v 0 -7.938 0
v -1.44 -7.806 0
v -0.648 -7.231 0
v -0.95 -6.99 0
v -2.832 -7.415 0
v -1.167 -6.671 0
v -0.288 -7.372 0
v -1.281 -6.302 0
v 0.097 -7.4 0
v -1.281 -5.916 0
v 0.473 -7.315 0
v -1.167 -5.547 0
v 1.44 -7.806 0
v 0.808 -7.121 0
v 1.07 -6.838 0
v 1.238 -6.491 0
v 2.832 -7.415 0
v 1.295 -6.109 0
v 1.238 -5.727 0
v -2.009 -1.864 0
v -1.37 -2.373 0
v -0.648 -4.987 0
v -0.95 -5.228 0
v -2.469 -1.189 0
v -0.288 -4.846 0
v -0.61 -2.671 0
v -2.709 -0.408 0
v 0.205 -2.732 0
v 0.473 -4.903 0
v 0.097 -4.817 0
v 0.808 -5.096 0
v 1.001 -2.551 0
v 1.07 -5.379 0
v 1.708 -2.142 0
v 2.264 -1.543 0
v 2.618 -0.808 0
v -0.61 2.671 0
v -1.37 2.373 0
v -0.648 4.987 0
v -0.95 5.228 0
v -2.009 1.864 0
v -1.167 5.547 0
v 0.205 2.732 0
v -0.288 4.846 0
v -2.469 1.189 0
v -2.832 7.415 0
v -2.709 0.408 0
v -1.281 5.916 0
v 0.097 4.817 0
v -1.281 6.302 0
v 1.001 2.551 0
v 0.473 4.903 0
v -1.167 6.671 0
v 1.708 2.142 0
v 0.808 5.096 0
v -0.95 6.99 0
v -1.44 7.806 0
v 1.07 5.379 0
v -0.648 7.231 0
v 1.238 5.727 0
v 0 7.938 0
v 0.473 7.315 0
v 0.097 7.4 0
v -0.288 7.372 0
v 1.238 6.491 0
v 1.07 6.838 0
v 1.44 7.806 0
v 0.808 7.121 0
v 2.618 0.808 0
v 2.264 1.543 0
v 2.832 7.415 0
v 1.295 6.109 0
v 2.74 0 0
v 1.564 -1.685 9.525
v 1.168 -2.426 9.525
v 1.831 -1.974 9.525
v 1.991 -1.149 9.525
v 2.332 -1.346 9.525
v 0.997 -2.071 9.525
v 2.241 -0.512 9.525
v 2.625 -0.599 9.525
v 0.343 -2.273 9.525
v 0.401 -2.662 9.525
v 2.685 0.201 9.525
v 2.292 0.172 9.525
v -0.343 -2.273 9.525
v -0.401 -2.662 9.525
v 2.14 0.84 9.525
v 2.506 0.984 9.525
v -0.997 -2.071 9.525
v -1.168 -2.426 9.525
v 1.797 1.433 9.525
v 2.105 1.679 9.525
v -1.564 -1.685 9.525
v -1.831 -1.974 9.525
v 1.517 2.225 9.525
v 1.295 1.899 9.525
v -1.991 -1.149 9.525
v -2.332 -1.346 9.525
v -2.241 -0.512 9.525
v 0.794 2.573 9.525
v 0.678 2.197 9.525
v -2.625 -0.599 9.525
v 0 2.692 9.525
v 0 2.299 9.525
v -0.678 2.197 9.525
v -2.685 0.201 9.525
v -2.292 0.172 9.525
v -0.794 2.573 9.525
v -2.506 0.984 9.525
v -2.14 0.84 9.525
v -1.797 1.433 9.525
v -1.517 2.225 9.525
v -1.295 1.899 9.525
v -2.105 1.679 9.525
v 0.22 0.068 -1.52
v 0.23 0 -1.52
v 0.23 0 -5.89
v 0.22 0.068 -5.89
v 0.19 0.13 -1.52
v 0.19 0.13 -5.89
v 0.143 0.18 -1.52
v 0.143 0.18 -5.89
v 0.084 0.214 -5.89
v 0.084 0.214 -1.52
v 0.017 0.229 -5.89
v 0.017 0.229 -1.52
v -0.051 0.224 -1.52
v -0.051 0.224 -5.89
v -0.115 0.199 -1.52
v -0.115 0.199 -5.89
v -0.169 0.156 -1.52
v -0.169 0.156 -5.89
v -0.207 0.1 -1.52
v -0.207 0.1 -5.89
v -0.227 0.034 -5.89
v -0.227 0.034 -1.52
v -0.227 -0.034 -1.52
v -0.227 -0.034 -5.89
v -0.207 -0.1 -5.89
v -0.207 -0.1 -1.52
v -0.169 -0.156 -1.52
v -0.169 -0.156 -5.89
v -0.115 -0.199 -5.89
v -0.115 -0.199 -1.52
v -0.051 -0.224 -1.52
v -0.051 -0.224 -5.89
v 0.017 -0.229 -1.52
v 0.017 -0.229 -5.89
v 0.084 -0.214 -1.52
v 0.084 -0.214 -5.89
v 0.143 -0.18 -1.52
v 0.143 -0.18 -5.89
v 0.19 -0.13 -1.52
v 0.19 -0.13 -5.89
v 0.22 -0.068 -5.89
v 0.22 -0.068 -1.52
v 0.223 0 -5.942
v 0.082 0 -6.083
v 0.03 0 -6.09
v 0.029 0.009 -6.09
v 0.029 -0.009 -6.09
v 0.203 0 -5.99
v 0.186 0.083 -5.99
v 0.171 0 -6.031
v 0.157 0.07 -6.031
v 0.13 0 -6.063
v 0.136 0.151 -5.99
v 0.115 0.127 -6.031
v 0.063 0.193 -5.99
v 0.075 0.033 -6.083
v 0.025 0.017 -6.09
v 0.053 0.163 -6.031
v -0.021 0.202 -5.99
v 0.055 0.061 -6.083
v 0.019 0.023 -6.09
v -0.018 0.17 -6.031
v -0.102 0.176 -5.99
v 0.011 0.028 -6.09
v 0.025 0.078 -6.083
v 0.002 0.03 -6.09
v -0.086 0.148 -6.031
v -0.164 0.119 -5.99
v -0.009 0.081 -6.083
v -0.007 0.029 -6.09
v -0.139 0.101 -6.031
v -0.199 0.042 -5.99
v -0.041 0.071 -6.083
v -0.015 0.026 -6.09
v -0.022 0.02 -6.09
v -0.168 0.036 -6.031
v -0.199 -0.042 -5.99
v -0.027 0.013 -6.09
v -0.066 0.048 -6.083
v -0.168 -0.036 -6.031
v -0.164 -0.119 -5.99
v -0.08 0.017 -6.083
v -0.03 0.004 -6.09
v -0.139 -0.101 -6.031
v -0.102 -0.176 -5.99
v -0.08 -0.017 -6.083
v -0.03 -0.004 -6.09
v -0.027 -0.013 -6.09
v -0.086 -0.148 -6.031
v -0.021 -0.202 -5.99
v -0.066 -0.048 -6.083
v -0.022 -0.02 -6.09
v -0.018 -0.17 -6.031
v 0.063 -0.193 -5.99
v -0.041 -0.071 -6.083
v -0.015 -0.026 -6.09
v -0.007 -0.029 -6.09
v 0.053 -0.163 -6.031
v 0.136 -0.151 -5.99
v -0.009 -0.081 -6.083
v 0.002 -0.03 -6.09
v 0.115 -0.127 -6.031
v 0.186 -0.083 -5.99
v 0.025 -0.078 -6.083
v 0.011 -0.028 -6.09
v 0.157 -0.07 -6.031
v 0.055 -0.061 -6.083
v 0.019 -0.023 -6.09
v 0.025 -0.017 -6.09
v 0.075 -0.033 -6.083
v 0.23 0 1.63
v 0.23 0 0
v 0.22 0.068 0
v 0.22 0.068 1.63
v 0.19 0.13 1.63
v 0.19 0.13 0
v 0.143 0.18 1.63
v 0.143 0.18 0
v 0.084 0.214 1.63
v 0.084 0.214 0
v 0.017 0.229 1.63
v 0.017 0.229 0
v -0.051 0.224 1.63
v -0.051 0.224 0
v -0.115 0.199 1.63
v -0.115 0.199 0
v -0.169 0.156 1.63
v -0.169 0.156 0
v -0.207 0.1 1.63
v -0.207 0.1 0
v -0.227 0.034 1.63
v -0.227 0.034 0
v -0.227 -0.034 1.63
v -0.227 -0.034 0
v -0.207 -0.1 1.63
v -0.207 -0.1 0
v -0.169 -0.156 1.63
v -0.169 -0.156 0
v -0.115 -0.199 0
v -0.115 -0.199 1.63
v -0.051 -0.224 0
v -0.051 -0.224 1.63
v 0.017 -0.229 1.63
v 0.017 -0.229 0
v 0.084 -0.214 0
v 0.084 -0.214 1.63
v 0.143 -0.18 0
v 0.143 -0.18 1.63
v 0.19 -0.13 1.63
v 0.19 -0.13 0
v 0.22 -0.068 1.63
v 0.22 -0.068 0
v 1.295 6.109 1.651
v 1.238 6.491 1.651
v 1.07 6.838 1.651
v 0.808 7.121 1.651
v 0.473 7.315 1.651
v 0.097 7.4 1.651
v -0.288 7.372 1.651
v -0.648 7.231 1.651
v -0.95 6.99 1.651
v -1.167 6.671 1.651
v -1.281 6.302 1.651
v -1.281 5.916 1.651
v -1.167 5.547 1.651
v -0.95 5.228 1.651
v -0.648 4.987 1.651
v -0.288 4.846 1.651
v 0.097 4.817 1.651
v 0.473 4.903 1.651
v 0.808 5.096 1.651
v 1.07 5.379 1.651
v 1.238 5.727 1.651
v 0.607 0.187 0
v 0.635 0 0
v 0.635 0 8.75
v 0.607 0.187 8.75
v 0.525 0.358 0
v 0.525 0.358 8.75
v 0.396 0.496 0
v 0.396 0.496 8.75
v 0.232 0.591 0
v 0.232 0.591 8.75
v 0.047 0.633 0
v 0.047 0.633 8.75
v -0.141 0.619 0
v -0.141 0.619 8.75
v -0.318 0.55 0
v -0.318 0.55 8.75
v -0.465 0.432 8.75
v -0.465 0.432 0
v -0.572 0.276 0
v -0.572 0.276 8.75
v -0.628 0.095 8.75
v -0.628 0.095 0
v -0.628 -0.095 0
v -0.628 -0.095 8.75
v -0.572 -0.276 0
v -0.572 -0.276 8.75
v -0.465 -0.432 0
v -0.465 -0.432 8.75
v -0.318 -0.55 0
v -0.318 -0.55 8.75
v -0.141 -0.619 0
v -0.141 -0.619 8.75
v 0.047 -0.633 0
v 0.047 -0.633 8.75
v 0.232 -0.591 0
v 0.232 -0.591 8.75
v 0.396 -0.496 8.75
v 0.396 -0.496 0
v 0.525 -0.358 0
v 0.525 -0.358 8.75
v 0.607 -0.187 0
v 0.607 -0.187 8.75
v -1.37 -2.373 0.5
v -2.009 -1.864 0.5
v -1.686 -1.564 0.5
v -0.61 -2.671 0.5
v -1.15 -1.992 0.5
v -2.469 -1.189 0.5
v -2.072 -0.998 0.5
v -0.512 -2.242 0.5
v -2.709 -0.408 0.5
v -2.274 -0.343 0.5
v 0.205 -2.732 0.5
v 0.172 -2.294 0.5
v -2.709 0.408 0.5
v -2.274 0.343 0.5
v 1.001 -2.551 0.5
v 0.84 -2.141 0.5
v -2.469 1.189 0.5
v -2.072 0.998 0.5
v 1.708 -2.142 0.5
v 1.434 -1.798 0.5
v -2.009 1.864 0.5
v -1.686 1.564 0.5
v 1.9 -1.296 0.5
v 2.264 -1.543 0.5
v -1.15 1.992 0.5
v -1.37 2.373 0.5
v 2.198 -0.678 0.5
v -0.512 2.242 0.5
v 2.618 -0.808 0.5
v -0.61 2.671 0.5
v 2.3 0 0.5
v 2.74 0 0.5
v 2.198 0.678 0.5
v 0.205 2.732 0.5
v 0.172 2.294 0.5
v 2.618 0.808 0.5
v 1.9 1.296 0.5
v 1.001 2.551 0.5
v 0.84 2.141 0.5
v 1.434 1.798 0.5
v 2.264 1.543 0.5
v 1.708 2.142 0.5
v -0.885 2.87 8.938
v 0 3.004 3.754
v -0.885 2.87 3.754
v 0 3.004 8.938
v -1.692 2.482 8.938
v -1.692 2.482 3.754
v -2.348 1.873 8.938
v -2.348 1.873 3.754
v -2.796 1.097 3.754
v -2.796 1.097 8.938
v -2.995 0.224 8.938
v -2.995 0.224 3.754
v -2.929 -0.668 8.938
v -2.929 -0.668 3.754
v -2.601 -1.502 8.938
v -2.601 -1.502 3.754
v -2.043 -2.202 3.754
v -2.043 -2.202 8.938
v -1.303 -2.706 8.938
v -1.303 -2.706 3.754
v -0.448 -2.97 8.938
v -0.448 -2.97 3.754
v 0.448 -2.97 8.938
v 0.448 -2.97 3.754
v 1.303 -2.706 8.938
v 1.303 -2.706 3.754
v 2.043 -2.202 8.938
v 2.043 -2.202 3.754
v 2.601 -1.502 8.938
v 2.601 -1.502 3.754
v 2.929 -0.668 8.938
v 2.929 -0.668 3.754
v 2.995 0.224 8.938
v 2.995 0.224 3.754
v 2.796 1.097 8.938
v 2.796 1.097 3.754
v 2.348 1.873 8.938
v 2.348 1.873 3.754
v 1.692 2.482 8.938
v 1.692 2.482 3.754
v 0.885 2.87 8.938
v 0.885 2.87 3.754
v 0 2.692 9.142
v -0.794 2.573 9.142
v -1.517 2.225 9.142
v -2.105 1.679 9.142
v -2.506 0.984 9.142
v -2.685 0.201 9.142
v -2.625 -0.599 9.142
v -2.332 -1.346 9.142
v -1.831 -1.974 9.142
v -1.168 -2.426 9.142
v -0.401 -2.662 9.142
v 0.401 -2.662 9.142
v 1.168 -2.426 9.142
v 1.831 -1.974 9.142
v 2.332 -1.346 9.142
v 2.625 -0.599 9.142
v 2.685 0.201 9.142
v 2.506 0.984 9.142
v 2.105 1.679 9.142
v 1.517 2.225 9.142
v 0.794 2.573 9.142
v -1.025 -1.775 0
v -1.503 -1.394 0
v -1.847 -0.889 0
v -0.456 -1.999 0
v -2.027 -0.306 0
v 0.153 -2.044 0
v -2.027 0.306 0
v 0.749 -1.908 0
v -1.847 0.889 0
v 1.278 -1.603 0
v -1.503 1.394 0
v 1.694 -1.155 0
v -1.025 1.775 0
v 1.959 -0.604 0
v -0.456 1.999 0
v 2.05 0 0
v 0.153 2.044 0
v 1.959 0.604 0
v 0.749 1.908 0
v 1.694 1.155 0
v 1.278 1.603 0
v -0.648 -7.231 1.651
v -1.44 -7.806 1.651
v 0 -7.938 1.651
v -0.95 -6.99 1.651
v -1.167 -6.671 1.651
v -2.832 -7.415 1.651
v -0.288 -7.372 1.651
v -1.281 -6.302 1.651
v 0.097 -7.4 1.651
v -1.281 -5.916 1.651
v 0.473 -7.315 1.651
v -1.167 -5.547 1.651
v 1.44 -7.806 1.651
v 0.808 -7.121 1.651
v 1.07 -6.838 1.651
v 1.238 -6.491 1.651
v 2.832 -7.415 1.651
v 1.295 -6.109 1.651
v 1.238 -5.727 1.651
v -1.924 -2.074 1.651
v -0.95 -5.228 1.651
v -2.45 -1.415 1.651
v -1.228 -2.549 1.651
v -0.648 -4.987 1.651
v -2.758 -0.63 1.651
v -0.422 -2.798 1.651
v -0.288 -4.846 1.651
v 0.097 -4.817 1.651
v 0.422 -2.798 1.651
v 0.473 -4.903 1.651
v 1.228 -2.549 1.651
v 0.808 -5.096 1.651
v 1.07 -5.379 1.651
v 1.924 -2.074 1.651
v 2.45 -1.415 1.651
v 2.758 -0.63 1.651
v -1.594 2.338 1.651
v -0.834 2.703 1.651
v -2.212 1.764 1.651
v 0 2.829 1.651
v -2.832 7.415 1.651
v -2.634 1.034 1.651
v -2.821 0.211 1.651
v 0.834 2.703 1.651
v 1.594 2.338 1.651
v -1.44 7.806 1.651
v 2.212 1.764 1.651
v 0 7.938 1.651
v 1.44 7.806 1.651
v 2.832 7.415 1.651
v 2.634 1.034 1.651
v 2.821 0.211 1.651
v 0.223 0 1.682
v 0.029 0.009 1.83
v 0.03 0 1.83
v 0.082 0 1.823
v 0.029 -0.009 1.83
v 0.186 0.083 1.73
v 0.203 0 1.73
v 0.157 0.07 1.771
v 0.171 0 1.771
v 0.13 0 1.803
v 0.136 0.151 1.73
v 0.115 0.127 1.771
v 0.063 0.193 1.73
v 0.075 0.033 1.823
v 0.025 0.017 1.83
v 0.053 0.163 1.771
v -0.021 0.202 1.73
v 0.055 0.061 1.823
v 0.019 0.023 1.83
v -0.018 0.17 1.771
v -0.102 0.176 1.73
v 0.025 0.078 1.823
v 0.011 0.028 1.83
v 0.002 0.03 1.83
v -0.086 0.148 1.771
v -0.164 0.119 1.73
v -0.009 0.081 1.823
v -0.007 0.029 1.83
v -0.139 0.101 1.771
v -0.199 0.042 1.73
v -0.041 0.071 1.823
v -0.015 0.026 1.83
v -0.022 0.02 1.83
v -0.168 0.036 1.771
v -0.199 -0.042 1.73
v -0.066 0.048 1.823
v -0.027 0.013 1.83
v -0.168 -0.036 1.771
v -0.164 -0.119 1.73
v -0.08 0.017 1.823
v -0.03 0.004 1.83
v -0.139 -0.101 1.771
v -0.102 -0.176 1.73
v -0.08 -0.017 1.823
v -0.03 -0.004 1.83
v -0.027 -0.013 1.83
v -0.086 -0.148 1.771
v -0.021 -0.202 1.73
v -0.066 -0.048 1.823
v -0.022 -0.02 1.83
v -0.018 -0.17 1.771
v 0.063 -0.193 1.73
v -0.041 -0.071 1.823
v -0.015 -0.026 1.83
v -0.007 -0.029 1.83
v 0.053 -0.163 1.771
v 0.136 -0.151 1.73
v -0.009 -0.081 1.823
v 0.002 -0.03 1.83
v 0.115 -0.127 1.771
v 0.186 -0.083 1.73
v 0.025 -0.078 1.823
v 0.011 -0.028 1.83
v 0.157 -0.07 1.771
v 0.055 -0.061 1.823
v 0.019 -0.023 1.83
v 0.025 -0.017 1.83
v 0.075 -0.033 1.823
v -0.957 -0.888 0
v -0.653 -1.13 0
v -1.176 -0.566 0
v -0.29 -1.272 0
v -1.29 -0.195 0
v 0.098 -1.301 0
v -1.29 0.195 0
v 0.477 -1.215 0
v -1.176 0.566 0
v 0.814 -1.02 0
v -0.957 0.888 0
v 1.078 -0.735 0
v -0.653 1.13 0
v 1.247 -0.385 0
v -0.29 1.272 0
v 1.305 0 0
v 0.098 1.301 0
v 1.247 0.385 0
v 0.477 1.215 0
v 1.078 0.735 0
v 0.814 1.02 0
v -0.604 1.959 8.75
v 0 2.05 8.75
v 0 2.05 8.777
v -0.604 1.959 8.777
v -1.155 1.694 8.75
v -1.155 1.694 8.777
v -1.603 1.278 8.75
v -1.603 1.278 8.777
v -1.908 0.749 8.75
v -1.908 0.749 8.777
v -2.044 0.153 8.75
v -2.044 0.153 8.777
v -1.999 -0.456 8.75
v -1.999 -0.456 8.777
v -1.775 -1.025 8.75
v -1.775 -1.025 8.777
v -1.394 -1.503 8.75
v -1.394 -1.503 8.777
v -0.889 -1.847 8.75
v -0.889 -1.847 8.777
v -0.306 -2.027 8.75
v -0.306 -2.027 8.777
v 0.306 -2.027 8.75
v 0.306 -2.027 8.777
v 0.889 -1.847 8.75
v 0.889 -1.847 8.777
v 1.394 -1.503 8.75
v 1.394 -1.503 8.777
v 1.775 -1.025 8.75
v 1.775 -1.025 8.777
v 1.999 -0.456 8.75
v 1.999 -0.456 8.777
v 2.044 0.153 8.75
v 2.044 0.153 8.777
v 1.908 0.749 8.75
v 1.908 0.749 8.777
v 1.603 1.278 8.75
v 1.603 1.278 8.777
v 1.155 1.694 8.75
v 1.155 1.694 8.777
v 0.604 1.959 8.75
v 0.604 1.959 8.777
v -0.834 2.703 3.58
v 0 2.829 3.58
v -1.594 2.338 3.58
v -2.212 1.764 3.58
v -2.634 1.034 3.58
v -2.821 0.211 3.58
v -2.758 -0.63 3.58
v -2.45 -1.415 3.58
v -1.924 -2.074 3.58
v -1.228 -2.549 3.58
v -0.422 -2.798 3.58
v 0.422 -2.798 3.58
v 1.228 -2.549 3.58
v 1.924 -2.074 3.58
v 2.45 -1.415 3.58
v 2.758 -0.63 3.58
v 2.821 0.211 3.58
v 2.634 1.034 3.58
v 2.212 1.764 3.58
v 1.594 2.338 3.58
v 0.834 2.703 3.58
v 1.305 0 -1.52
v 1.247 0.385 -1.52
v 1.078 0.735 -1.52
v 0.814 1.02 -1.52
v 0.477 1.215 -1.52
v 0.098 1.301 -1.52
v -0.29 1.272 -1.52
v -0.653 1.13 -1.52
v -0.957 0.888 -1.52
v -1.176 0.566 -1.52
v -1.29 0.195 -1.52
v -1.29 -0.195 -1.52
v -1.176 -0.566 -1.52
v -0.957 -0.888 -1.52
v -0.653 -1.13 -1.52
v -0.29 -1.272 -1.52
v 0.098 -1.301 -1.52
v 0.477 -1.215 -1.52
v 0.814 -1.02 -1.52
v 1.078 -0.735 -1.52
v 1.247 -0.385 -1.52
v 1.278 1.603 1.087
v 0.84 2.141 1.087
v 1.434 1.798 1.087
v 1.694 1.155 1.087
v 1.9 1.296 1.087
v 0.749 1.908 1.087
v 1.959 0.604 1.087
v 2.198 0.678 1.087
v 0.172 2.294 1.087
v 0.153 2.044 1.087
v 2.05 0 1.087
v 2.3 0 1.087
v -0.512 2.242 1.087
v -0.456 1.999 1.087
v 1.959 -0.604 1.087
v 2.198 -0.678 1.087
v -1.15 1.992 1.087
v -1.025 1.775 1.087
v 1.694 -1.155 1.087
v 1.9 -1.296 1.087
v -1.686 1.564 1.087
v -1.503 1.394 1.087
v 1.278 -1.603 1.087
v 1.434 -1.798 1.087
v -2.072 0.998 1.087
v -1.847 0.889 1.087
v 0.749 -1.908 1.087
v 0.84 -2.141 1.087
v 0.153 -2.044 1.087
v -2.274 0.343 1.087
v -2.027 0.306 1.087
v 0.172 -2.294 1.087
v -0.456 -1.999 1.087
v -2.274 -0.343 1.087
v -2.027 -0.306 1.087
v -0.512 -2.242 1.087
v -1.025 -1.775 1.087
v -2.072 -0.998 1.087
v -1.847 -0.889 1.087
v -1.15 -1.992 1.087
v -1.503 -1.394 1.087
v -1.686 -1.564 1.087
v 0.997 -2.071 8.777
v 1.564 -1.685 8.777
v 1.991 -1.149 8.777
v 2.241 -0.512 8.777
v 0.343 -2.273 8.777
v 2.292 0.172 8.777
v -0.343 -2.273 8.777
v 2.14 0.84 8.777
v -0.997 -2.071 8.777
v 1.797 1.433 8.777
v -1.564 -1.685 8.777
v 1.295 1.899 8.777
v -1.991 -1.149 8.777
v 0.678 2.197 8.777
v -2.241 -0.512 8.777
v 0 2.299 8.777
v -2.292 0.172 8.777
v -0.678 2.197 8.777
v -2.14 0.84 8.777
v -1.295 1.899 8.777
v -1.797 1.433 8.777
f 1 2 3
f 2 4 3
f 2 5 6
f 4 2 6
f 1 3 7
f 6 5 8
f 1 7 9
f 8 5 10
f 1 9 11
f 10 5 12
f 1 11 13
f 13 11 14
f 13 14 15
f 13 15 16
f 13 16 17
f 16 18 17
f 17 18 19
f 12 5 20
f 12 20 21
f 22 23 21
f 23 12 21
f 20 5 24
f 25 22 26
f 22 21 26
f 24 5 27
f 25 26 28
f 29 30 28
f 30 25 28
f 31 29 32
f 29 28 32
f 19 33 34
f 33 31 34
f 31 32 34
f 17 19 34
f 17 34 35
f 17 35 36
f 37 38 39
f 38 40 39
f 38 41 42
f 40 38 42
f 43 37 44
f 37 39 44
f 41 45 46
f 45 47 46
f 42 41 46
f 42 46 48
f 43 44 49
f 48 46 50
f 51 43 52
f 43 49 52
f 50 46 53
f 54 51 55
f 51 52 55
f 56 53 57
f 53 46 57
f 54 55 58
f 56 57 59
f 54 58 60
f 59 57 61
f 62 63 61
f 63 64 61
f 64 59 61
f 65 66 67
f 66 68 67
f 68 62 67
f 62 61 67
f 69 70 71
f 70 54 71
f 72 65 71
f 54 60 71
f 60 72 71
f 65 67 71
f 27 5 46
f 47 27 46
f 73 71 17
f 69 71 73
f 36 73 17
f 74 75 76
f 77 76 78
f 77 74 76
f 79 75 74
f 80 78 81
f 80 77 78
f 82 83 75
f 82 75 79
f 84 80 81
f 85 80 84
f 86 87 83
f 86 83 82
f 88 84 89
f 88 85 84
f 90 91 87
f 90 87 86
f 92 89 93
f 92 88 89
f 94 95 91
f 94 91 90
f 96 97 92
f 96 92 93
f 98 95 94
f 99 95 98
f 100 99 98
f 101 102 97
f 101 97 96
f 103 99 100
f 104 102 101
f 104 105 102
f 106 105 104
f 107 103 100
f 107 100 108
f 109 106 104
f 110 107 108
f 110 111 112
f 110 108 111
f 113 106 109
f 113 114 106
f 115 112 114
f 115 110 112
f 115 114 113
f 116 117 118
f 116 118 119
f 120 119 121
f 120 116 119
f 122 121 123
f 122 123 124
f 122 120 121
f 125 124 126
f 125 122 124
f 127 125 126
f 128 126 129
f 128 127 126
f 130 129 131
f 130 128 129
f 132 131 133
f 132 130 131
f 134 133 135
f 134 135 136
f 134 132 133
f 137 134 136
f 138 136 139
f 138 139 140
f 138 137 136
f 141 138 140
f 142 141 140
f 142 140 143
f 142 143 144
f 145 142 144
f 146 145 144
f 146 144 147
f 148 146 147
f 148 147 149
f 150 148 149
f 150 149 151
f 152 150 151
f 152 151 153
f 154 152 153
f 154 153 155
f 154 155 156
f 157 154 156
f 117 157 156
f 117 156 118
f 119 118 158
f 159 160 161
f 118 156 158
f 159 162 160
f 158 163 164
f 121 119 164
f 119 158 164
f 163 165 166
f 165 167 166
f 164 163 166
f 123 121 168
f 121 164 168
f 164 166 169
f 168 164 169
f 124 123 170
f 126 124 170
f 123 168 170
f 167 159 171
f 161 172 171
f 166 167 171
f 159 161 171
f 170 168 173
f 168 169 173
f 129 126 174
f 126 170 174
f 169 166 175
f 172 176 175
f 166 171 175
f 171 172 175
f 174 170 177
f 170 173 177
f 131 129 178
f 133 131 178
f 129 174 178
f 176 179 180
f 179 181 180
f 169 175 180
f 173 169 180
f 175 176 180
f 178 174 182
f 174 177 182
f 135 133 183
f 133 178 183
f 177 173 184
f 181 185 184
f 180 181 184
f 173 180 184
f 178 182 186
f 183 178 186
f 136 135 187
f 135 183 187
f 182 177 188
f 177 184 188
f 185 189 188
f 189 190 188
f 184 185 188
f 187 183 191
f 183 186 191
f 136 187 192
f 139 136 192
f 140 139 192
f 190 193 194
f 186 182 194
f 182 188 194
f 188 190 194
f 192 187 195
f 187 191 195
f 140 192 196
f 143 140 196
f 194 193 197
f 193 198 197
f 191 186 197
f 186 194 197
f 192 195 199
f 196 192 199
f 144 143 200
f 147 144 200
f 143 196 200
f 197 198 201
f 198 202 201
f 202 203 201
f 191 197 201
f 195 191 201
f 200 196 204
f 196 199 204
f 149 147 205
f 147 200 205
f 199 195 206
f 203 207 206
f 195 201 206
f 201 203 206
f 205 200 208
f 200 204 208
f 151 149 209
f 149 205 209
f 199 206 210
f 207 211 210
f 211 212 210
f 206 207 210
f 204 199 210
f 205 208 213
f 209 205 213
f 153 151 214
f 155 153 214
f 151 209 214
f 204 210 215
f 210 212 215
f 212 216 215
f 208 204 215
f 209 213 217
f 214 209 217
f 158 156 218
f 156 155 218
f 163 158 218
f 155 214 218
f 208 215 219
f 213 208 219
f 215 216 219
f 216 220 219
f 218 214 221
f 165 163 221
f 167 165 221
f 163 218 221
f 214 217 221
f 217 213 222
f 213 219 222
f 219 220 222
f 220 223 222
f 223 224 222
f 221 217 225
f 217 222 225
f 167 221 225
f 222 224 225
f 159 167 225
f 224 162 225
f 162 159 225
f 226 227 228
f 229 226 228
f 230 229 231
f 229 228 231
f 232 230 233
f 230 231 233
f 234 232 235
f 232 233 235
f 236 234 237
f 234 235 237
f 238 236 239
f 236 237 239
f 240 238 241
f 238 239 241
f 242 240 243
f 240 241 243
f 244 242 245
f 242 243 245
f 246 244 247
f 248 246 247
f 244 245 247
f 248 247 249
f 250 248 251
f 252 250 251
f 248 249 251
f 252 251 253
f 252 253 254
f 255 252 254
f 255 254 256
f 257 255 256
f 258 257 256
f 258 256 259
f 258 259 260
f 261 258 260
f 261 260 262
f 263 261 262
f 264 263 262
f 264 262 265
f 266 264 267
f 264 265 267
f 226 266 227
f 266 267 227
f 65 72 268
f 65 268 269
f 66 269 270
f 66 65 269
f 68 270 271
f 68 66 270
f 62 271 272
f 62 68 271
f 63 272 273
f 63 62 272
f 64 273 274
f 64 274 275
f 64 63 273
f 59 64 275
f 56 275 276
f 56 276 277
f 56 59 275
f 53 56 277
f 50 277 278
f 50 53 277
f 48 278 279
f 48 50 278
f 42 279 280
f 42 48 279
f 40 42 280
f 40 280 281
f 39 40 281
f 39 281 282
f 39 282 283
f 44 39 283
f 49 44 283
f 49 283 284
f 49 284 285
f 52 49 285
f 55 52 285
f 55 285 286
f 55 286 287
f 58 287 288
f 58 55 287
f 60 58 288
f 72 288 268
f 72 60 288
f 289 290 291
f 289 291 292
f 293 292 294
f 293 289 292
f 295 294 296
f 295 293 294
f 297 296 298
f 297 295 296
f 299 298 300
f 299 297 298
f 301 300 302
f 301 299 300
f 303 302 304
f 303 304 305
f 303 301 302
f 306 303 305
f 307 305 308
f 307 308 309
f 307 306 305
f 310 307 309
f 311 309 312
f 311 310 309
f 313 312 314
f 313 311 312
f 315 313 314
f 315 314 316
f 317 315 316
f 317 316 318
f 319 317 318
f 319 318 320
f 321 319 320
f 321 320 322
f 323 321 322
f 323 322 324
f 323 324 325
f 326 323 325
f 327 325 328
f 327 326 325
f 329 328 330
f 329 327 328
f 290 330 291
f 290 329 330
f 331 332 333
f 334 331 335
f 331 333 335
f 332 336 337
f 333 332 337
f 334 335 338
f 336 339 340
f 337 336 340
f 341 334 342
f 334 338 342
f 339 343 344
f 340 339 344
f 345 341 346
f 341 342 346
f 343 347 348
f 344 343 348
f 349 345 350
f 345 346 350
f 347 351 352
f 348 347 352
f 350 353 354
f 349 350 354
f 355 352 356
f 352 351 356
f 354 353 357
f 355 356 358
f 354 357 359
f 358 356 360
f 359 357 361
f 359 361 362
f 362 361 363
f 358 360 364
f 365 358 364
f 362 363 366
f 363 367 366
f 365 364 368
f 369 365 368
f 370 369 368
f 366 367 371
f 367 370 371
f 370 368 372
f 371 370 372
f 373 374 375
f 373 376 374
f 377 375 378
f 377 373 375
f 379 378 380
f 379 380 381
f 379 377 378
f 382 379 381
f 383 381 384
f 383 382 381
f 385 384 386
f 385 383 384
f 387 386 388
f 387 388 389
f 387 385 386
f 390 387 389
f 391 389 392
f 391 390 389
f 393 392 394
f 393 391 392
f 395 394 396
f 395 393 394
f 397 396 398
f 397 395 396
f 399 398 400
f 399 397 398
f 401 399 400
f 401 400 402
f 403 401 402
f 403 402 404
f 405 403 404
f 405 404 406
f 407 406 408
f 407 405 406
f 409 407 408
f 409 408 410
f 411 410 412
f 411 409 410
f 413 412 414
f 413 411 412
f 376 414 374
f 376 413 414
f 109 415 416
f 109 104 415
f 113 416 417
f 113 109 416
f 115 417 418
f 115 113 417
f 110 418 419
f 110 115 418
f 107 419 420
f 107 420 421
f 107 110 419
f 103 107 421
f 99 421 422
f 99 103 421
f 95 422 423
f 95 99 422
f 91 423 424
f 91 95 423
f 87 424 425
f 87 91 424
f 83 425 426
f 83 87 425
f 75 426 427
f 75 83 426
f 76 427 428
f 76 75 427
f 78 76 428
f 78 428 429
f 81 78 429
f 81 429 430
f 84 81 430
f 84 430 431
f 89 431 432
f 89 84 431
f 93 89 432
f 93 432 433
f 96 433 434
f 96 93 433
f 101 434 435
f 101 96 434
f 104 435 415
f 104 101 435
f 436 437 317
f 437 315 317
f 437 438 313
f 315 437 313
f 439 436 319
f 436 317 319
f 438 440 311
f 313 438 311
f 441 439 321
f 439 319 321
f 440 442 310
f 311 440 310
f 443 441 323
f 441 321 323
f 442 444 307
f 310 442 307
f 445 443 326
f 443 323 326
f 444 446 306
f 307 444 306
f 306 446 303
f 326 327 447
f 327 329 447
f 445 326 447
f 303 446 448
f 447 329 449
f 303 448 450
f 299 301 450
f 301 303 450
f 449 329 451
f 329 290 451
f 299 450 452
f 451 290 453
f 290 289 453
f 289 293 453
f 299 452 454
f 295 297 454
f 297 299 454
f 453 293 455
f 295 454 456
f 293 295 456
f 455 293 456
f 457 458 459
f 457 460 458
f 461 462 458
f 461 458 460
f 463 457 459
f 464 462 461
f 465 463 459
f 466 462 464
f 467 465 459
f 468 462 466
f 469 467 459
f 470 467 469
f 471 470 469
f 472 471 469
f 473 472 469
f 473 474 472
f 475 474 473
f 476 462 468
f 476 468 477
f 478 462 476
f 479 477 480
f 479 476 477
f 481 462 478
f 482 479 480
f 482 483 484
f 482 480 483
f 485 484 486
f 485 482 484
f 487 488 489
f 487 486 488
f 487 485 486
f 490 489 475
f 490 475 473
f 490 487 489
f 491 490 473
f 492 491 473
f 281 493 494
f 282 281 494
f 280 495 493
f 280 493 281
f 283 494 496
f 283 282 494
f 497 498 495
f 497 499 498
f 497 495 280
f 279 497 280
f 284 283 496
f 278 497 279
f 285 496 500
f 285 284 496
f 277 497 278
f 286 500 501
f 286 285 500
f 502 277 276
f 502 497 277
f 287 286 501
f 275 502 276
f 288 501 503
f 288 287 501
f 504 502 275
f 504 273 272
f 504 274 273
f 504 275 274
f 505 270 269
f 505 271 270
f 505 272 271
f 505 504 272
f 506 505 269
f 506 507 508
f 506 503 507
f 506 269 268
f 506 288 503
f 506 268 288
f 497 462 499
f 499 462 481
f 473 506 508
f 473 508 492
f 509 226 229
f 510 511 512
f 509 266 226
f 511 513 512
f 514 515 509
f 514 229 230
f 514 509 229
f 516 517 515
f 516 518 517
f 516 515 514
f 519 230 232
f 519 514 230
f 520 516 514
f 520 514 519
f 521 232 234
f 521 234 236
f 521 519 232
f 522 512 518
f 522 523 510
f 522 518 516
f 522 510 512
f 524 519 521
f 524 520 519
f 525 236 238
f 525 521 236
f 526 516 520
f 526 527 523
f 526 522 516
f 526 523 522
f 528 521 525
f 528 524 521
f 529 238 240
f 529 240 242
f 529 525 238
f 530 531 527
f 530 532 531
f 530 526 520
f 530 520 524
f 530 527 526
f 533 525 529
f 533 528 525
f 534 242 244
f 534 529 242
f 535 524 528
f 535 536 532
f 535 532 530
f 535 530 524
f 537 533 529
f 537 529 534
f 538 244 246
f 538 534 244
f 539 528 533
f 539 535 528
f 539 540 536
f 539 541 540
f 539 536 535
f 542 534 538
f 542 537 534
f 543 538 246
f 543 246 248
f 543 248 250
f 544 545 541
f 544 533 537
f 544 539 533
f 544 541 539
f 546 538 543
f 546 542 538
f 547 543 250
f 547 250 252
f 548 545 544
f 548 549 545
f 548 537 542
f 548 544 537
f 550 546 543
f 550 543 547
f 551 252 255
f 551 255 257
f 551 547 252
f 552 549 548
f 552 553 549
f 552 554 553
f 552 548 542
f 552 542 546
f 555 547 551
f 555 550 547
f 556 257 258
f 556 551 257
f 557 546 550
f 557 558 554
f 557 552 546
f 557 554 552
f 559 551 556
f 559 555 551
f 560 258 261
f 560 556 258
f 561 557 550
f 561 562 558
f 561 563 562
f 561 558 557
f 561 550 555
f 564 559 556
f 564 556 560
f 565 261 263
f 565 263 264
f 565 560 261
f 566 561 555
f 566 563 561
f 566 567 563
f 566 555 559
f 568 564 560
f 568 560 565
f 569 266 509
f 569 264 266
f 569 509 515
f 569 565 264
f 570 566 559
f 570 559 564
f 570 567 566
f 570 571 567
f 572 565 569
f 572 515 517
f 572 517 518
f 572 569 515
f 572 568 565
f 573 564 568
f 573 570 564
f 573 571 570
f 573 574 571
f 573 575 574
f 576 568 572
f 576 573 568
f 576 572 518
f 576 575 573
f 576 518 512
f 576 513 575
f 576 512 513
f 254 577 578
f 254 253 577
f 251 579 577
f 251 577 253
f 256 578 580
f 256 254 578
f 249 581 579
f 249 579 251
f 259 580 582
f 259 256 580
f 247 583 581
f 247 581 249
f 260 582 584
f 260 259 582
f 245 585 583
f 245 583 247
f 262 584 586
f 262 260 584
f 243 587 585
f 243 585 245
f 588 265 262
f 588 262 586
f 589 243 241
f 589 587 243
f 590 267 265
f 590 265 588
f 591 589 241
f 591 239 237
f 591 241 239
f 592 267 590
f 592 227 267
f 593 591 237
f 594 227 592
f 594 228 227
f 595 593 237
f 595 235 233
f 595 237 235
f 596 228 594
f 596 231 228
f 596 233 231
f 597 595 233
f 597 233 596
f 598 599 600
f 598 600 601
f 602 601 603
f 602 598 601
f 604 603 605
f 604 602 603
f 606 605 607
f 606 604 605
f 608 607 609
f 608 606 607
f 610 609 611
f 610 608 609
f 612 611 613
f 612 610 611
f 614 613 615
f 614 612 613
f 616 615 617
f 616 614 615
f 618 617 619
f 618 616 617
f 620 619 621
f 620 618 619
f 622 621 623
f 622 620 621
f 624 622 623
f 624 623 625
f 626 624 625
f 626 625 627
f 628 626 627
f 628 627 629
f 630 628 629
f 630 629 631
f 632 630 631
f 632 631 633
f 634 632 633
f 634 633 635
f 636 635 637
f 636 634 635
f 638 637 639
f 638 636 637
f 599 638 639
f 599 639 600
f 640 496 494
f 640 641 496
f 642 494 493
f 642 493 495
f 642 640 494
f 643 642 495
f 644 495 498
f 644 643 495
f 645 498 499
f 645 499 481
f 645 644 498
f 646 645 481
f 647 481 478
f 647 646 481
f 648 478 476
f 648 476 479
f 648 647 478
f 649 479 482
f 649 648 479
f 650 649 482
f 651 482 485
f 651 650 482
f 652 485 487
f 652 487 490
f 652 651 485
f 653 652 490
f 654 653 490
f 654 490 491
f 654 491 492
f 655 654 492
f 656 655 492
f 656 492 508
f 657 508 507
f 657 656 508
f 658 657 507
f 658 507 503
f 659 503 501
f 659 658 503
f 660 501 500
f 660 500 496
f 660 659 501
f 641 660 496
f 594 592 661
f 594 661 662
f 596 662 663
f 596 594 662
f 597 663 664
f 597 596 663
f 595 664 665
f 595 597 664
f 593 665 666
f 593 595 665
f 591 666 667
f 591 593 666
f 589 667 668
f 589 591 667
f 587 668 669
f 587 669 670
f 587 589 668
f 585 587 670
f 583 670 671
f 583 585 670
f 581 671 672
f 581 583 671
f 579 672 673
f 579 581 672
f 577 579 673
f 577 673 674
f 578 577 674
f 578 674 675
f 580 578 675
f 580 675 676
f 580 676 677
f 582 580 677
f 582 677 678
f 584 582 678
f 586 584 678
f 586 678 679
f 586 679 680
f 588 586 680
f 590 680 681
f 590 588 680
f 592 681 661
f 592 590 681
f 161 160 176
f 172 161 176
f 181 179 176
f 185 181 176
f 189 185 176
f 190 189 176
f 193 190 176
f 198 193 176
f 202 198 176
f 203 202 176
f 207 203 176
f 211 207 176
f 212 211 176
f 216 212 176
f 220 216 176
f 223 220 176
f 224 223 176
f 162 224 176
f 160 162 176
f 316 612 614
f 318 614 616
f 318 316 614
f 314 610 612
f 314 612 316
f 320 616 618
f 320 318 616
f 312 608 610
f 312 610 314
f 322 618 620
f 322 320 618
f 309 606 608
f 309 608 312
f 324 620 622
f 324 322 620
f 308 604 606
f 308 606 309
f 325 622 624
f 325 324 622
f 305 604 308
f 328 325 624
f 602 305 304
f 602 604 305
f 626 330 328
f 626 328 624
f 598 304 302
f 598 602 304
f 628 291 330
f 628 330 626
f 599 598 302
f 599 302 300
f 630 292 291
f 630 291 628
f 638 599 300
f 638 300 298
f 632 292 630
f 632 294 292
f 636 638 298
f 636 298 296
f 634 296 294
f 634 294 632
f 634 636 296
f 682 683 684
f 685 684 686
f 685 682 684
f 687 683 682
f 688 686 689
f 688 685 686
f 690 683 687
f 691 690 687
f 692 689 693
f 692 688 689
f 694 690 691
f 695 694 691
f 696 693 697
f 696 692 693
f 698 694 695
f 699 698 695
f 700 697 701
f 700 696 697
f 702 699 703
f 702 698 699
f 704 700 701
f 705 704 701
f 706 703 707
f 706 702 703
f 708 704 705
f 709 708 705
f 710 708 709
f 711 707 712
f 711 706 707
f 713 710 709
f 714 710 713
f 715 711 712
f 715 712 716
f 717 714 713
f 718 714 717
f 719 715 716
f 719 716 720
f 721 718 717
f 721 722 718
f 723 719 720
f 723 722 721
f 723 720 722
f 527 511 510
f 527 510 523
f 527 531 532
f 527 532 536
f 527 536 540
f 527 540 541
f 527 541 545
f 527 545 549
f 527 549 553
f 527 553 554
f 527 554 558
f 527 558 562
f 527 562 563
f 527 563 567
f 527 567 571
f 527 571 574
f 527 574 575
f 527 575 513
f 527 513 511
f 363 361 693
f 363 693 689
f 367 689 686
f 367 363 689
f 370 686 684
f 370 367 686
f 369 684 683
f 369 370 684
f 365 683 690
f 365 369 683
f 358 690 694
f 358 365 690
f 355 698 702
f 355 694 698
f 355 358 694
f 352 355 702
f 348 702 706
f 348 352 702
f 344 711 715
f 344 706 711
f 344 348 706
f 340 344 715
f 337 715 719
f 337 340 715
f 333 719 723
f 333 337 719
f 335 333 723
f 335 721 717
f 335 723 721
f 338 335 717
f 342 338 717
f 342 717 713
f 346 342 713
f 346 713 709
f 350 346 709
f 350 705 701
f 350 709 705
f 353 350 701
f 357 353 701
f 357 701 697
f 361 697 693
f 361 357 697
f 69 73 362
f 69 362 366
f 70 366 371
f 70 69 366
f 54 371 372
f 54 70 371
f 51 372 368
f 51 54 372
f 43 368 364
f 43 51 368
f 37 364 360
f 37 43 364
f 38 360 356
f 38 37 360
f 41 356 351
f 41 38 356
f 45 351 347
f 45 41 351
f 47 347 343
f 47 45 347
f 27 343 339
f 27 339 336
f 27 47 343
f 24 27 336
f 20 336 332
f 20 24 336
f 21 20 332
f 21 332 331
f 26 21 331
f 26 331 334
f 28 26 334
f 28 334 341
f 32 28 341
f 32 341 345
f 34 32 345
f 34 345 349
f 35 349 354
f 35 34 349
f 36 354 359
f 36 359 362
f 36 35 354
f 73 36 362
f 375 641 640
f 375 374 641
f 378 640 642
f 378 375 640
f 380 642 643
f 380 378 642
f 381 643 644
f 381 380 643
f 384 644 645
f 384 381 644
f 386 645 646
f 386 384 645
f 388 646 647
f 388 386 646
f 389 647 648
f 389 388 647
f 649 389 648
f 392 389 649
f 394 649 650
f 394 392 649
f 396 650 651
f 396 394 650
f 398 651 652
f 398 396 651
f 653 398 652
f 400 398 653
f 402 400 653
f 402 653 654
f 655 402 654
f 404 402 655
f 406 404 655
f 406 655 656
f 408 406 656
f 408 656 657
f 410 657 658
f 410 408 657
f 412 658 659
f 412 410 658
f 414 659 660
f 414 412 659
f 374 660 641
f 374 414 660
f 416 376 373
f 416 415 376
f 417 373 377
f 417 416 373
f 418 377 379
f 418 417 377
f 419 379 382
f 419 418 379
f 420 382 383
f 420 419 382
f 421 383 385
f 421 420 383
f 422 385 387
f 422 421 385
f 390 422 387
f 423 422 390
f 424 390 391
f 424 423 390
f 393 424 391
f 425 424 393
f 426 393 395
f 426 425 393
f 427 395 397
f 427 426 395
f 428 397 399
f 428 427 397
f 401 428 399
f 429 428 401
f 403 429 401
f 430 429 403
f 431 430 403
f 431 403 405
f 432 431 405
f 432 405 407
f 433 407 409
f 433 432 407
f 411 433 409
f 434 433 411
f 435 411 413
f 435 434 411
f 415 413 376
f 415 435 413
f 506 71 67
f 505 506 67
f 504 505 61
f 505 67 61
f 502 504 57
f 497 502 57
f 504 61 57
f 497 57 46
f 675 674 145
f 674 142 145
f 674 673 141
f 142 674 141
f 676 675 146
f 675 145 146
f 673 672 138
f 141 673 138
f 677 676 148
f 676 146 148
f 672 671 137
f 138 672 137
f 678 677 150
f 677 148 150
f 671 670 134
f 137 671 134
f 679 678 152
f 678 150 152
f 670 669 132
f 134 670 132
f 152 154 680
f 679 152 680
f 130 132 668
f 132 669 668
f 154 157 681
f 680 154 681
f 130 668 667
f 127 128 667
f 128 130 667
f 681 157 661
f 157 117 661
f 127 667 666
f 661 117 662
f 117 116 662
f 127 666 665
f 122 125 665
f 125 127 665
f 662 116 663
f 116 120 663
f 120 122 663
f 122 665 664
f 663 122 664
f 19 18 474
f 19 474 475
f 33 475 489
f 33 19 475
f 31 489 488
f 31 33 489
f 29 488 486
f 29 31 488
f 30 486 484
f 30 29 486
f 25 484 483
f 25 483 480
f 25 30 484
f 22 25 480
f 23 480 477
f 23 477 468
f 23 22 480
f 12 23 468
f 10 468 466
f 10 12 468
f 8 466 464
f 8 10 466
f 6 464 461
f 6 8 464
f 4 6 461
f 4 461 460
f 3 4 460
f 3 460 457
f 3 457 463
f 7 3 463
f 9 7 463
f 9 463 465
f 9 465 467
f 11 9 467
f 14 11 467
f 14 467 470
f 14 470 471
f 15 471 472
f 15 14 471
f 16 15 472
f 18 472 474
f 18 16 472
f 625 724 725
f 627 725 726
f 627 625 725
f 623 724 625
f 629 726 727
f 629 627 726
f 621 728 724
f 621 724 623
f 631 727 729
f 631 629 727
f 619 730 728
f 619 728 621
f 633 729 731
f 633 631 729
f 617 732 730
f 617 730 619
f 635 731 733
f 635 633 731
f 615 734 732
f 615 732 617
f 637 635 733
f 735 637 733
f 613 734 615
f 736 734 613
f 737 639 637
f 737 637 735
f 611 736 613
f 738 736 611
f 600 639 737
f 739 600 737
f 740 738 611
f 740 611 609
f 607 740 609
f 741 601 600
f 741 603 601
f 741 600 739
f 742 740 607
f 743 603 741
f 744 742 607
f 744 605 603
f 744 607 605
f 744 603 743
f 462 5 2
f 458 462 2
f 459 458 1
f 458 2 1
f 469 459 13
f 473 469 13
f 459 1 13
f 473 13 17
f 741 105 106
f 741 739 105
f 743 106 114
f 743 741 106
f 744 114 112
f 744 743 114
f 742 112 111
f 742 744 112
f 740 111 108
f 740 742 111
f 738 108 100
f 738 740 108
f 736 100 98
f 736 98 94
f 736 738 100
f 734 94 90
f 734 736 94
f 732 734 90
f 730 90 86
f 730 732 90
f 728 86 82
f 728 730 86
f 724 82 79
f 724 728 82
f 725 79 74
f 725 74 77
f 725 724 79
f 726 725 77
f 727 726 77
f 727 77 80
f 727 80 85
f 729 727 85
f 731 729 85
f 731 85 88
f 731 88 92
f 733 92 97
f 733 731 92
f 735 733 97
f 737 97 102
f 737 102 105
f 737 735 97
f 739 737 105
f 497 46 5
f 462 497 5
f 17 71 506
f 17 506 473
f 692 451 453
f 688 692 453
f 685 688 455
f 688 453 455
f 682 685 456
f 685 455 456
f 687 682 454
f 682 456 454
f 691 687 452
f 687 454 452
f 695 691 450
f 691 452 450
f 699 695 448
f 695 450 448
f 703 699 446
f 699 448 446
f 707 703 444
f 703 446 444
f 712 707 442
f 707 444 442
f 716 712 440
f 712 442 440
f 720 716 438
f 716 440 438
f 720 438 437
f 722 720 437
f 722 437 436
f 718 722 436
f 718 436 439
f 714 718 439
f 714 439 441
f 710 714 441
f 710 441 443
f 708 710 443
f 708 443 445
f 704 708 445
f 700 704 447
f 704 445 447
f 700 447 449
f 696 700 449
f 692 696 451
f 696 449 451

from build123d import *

# Parameters (mm, degrees)
SKETCH_R          = 1.2954
SKETCH_R_2        = 2.3
PAD_DEPTH         = 1.651
SKETCH002_R       = 2.74
SKETCH002_R_2     = 1.91
POCKET_DEPTH      = 0.5
SKETCH003_R       = 2.05
SKETCH003_R_2     = 0.635
PAD001_DEPTH      = 8.75
SKETCH004_R       = 1.305
SKETCH004_R_2     = 0.23
PAD002_DEPTH      = 1.52
SKETCH005_R       = 0.23
PAD003_DEPTH      = 1.83
PAD003_DEPTH_BACK = 6.09
FILLET_R          = 0.2


with BuildPart() as body:
    # Sketch → Pad (new body)
    with BuildSketch(Plane.XY):
        with BuildLine():
            Line((-2.8321, 7.41506), (-2.8321, -7.41506))
            ThreePointArc((-2.8321, -7.41506), (0, -7.9375), (2.8321, -7.41506))
            Line((2.8321, 7.41506), (2.8321, -7.41506))
            ThreePointArc((2.8321, 7.41506), (0, 7.9375), (-2.8321, 7.41506))
        make_face()
        with Locations((0, 6.1087)):
            Circle(SKETCH_R, mode=Mode.SUBTRACT)
        with Locations((0, -6.1087)):
            Circle(SKETCH_R, mode=Mode.SUBTRACT)
        Circle(SKETCH_R_2, mode=Mode.SUBTRACT)
    extrude(amount=PAD_DEPTH)

    # Sketch002 → Pocket (cut)
    with BuildSketch(Plane.XY):
        Circle(SKETCH002_R)
        Circle(SKETCH002_R_2, mode=Mode.SUBTRACT)
    extrude(amount=POCKET_DEPTH, mode=Mode.SUBTRACT)

    # Sketch001 → Revolution (revolve)
    with BuildSketch(Plane.YZ):
        Polygon((2.829161, 1.086815), (2.829161, 3.579748), (3.003812, 3.754399), (3.003812, 8.938169), (2.6924, 9.14224), (2.6924, 9.525), (2.2987, 9.525), (2.2987, 8.777293), (2.05, 8.777293), (2.05, 1.086815), align=None)
    revolve(axis=Axis((0, 0, 0), (0, 0, 1)))

    # Sketch003 → Pad001 (join)
    with BuildSketch(Plane.XY):
        Circle(SKETCH003_R)
        Circle(SKETCH003_R_2, mode=Mode.SUBTRACT)
    extrude(amount=PAD001_DEPTH)


with BuildPart() as body001:
    # Sketch004 → Pad002 (new body)
    with BuildSketch(Plane.XY):
        Circle(SKETCH004_R)
        Circle(SKETCH004_R_2, mode=Mode.SUBTRACT)
    extrude(amount=-PAD002_DEPTH)

    # Sketch005 → Pad003 (join, two sides)
    with BuildSketch(Plane.XY) as pad003_sk:
        Circle(SKETCH005_R)
    extrude(amount=PAD003_DEPTH)
    extrude(pad003_sk.sketch, amount=-PAD003_DEPTH_BACK)

    # Fillet
    fillet_edges = [body001.edges().sort_by_distance(p)[0] for p in [
        (-0.23, 0, -6.09),
        (-0.23, 0, 1.83),
    ]]
    fillet(fillet_edges, radius=FILLET_R)


solid = Compound([body.part, body001.part])
